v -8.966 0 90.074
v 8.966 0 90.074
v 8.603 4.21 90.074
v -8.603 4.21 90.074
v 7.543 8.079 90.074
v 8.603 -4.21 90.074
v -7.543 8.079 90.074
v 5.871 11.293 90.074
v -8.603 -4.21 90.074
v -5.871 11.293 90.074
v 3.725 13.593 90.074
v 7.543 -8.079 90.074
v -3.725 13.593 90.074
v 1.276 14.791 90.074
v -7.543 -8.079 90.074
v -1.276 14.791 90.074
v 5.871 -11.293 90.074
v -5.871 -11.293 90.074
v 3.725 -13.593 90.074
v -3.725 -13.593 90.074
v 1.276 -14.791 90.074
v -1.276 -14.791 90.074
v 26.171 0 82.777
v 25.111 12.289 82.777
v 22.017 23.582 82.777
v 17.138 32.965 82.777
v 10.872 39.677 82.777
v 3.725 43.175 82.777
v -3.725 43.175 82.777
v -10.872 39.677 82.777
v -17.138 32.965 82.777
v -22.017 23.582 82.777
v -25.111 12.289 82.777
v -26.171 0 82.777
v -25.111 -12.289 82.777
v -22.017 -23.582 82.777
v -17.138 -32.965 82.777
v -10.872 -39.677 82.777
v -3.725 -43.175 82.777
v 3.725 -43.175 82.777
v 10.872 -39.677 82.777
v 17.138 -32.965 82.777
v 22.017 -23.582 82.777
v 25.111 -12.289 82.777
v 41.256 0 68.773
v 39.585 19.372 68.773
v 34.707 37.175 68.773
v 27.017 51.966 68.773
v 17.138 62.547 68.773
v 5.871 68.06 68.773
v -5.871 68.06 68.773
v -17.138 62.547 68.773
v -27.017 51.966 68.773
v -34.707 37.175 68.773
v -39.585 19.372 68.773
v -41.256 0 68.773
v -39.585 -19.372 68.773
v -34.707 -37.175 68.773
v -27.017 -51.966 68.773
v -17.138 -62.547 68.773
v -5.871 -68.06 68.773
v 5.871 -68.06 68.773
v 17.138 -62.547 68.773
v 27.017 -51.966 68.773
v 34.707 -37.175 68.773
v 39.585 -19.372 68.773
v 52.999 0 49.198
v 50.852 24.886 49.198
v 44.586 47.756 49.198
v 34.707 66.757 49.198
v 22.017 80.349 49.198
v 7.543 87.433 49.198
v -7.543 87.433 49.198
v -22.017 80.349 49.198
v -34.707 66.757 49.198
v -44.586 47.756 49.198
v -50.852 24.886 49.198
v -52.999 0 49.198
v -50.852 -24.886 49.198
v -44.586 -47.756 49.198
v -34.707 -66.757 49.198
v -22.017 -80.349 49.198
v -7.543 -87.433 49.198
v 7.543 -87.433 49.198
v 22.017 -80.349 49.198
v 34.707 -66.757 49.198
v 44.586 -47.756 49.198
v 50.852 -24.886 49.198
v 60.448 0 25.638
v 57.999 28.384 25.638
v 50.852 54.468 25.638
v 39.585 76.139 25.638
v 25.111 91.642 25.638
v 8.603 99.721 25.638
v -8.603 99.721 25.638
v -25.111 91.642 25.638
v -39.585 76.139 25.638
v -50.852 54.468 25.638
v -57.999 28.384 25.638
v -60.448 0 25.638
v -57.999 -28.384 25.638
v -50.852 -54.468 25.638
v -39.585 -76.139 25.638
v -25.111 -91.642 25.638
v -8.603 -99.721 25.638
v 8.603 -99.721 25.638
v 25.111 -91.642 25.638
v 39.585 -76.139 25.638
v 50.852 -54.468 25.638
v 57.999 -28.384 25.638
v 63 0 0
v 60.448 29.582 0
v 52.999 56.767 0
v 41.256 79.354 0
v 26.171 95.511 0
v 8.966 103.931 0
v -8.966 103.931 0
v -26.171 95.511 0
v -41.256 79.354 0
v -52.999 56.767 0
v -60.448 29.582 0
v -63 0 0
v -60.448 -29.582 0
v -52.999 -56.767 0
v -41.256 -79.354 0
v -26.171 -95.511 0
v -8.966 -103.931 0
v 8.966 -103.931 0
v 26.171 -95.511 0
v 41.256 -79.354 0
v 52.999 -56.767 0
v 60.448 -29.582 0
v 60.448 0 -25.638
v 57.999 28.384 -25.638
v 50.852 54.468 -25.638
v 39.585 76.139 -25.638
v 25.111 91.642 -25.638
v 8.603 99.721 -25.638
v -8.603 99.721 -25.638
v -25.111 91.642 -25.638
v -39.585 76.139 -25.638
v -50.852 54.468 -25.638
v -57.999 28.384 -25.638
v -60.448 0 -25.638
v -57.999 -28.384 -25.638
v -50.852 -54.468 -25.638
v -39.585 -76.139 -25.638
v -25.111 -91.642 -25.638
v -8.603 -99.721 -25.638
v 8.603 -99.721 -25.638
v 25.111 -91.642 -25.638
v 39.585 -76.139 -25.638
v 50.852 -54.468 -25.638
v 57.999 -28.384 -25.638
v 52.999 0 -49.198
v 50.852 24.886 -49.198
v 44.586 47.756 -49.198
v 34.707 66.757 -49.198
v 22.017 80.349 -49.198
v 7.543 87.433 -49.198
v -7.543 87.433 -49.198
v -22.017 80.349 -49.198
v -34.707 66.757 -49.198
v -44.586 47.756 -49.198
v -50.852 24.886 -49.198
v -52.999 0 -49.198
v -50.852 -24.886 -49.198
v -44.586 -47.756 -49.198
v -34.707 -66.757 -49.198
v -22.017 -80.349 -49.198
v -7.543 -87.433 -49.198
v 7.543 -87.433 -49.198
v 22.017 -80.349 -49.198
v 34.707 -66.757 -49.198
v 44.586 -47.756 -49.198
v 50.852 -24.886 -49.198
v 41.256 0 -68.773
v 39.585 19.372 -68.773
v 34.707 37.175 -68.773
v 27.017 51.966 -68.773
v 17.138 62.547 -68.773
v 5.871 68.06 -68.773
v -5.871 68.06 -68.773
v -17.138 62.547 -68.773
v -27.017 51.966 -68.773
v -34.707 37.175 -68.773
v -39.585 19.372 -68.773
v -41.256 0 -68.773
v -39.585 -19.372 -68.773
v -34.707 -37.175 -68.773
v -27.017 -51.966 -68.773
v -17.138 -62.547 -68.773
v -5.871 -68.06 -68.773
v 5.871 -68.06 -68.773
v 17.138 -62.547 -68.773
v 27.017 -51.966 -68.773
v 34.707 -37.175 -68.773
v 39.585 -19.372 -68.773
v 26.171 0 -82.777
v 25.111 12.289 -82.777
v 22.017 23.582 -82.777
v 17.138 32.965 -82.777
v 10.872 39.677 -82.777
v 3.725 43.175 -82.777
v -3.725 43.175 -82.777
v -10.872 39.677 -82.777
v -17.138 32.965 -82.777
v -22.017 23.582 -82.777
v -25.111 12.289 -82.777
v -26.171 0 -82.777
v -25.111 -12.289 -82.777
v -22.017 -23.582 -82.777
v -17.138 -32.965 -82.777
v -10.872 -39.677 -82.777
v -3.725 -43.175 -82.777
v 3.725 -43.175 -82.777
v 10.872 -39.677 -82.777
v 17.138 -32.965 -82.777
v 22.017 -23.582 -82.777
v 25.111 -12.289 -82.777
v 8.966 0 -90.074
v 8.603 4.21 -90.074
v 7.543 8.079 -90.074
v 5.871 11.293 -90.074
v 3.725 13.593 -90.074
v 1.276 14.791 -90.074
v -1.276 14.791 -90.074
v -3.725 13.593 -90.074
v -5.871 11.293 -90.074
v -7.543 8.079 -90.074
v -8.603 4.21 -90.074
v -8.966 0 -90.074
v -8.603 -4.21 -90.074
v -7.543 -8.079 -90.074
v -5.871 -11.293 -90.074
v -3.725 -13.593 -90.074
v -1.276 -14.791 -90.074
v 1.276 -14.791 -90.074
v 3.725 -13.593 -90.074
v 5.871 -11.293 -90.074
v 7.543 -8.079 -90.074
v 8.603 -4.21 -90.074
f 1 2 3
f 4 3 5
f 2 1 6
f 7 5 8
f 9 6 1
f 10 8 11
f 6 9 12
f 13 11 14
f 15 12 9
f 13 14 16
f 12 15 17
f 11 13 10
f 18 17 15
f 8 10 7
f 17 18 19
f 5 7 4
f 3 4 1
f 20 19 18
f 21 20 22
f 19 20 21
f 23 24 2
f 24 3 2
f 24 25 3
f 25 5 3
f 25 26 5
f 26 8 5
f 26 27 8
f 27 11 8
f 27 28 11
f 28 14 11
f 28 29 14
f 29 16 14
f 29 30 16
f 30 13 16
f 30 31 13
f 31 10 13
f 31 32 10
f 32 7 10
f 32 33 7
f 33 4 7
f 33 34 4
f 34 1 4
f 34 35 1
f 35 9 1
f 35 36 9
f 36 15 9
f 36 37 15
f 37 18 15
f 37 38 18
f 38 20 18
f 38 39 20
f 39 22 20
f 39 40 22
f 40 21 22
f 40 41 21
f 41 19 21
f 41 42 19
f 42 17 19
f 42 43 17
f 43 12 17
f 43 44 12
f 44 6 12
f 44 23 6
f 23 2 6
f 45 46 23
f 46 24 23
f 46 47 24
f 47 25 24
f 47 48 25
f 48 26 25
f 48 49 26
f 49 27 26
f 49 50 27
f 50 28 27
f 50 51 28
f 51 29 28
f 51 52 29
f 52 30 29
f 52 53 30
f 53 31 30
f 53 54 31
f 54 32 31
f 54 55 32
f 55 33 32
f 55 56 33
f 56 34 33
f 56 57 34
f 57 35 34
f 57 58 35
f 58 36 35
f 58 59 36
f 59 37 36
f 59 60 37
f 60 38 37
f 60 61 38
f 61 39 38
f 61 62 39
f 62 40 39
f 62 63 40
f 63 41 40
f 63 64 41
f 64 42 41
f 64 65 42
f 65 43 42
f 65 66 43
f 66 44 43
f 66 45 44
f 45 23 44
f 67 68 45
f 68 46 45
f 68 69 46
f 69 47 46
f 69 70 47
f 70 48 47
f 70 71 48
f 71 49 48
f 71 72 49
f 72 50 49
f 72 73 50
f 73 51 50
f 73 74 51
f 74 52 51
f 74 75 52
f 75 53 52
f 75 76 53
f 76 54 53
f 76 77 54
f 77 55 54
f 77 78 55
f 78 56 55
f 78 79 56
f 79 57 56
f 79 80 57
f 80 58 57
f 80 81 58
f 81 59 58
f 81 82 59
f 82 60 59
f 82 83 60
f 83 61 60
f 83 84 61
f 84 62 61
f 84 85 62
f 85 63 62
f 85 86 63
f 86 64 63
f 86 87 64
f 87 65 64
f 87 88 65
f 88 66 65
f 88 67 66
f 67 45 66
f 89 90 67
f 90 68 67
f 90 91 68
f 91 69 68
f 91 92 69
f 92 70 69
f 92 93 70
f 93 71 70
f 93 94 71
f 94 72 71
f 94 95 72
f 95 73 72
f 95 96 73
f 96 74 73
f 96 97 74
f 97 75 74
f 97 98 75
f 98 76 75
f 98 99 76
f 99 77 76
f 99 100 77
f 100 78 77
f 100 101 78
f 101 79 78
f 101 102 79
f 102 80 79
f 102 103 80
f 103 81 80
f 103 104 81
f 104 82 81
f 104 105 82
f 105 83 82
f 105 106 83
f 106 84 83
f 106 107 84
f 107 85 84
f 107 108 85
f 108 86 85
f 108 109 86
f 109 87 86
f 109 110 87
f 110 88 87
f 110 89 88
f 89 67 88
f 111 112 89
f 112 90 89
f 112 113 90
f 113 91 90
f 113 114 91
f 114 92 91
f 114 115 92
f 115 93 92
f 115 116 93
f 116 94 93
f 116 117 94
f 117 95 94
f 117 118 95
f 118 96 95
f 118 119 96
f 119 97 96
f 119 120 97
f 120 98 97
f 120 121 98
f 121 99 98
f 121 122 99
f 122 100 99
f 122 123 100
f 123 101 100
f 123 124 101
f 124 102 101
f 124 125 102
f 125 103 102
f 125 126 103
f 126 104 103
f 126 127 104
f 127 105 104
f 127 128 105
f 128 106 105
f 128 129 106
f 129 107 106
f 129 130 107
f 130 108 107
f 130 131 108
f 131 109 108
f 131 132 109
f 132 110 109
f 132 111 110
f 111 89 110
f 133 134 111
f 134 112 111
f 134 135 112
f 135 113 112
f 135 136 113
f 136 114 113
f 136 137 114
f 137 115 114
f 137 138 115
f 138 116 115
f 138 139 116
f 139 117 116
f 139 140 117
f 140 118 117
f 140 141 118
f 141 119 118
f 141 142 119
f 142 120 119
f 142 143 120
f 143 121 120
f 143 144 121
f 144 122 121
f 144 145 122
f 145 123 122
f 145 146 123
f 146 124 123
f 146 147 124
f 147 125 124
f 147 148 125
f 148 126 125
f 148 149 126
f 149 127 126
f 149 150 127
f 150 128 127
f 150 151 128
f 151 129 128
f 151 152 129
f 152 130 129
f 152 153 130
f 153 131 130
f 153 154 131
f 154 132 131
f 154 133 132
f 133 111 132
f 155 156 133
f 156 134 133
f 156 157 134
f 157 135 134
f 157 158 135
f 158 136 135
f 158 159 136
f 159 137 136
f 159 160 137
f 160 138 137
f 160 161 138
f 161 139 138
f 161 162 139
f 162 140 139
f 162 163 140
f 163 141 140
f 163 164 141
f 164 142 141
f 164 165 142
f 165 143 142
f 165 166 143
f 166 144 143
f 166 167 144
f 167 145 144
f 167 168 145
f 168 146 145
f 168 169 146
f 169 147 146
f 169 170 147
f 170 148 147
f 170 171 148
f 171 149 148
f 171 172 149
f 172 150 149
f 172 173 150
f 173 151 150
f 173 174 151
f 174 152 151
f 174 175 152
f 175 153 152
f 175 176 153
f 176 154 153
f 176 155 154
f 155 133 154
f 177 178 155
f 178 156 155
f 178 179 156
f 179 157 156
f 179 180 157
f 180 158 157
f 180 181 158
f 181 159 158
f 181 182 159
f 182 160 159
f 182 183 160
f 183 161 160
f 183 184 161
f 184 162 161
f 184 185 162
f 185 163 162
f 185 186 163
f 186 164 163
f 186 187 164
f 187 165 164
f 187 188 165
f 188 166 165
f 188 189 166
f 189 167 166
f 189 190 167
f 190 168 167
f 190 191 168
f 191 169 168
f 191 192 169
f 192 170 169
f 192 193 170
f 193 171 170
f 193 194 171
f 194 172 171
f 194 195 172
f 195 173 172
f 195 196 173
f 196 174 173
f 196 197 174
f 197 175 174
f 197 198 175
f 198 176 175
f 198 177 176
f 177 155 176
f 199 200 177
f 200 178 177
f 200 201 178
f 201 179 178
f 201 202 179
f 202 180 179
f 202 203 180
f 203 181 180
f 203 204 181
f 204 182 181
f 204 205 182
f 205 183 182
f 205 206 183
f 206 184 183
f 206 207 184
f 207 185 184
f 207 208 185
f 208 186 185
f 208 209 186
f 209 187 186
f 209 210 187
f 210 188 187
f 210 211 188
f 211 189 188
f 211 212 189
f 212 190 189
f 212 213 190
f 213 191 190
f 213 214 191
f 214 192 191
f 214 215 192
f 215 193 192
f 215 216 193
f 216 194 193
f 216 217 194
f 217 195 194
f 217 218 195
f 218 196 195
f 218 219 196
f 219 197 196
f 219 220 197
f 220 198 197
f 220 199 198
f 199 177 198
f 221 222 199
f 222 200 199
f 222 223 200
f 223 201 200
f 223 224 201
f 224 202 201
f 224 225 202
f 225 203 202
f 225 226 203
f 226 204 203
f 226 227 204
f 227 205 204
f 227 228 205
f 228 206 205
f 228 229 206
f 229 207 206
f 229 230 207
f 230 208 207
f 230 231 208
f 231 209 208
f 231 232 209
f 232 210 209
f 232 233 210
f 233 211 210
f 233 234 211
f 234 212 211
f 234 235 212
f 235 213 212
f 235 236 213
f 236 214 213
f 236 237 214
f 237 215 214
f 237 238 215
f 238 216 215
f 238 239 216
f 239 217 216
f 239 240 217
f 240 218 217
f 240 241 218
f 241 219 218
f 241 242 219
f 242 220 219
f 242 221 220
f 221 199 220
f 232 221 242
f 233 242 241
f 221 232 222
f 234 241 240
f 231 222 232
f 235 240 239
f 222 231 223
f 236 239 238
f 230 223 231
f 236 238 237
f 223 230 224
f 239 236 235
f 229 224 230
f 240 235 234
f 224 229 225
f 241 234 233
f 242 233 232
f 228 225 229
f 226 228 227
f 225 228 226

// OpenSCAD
// Generated by SolidPython 1.0.1 on 2020-07-29 00:46:49


scale(v = [9, 15, 13]) {
	sphere(r = 7);
}
/***********************************************
*********      SolidPython code:      **********
************************************************
 
# import packages: SolidPython
from solid import *
from solid.utils import *
from itertools import chain, combinations, permutations


class Resize:

    def __init__(self, scad_file):
        self.scad_file = scad_file
        #self.scad_file = import_scad(scad_file)
        # cone/cylinder param:
        self.r1 = 0
        self.r2 = 0
        self.h = 0
        # rectangular prism param:
        self.w = 0
        self.l = 0
        # ellipse param:
        self.r = 0

    # import OpenScad code (file name corresponds to shape)


    # classify shape + parameters
    def assign(self, param1, param2, param3):
        if self.scad_file == 'cone.scad':
            self.r1 = param1
            self.r2 = param2
            self.h = param3
        elif self.scad_file == 'cylinder.scad':
            self.r1 = param1
            self.r2 = param2
            self.h = param3
        elif self.scad_file == 'rectangularPrism.scad':
            self.h = param1
            self.l = param2
            self.w = param3
        else:
            self.r = param1
            self.h = param2

    # resize parameters
    def iterate(self):
        x = range(3, 20, 2)
        i = 1
        if self.scad_file == 'cone.scad':
            tempList = list(permutations(x, 2))
            for temp in tempList:
                param1 = temp[0]
                param2 = temp[1]
                filepath = 'produced_scad_files/' + 'cone' + str(param1) + '_' + str(param2) + '_' + '.scad'
                scad_render_to_file(cylinder(h=param1, r1=param2, r2=0), filepath)

        elif self.scad_file == 'cylinder.scad':
            tempList = list(permutations(x, 3))
            for temp in tempList:
                param1 = temp[0]
                param2 = temp[1]
                filepath = 'produced_scad_files/' + 'cylinder' + str(param1) + '_' + str(param2) + '_' + '.scad'
                scad_render_to_file(cylinder(h=param1, r1=param2, r2=param2), filepath)

        elif self.scad_file == 'rectangularPrism.scad':
            tempList = list(permutations(x, 3))
            for temp in tempList:
                param1 = temp[0]
                param2 = temp[1]
                param3 = temp[2]
                filepath = 'produced_scad_files/' + 'rectangularPrism' + str(param1) + '_' + str(param2) + '_' + str(
                    param3) + '.scad'
                scad_render_to_file(cube(size=(param1, param2, param3)), filepath)

        elif self.scad_file == 'ellipse.scad':
            tempList = list(permutations(x, 4))
            for temp in tempList:
                param1 = temp[0]
                param2 = temp[1]
                param3 = temp[2]
                param4 = temp[3]
                filepath = 'produced_scad_files/' + 'ellipse' + str(param1) + '_' + str(param2) + '_' + str(param3) + '_' + str(param4) + '.scad'
                scad_render_to_file(scale([param1, param2, param3])(sphere(r=param4)), filepath)

    def render_to_scadfile(self):
        scad_render_to_file(scad, 'example.scad') 
 
************************************************/
